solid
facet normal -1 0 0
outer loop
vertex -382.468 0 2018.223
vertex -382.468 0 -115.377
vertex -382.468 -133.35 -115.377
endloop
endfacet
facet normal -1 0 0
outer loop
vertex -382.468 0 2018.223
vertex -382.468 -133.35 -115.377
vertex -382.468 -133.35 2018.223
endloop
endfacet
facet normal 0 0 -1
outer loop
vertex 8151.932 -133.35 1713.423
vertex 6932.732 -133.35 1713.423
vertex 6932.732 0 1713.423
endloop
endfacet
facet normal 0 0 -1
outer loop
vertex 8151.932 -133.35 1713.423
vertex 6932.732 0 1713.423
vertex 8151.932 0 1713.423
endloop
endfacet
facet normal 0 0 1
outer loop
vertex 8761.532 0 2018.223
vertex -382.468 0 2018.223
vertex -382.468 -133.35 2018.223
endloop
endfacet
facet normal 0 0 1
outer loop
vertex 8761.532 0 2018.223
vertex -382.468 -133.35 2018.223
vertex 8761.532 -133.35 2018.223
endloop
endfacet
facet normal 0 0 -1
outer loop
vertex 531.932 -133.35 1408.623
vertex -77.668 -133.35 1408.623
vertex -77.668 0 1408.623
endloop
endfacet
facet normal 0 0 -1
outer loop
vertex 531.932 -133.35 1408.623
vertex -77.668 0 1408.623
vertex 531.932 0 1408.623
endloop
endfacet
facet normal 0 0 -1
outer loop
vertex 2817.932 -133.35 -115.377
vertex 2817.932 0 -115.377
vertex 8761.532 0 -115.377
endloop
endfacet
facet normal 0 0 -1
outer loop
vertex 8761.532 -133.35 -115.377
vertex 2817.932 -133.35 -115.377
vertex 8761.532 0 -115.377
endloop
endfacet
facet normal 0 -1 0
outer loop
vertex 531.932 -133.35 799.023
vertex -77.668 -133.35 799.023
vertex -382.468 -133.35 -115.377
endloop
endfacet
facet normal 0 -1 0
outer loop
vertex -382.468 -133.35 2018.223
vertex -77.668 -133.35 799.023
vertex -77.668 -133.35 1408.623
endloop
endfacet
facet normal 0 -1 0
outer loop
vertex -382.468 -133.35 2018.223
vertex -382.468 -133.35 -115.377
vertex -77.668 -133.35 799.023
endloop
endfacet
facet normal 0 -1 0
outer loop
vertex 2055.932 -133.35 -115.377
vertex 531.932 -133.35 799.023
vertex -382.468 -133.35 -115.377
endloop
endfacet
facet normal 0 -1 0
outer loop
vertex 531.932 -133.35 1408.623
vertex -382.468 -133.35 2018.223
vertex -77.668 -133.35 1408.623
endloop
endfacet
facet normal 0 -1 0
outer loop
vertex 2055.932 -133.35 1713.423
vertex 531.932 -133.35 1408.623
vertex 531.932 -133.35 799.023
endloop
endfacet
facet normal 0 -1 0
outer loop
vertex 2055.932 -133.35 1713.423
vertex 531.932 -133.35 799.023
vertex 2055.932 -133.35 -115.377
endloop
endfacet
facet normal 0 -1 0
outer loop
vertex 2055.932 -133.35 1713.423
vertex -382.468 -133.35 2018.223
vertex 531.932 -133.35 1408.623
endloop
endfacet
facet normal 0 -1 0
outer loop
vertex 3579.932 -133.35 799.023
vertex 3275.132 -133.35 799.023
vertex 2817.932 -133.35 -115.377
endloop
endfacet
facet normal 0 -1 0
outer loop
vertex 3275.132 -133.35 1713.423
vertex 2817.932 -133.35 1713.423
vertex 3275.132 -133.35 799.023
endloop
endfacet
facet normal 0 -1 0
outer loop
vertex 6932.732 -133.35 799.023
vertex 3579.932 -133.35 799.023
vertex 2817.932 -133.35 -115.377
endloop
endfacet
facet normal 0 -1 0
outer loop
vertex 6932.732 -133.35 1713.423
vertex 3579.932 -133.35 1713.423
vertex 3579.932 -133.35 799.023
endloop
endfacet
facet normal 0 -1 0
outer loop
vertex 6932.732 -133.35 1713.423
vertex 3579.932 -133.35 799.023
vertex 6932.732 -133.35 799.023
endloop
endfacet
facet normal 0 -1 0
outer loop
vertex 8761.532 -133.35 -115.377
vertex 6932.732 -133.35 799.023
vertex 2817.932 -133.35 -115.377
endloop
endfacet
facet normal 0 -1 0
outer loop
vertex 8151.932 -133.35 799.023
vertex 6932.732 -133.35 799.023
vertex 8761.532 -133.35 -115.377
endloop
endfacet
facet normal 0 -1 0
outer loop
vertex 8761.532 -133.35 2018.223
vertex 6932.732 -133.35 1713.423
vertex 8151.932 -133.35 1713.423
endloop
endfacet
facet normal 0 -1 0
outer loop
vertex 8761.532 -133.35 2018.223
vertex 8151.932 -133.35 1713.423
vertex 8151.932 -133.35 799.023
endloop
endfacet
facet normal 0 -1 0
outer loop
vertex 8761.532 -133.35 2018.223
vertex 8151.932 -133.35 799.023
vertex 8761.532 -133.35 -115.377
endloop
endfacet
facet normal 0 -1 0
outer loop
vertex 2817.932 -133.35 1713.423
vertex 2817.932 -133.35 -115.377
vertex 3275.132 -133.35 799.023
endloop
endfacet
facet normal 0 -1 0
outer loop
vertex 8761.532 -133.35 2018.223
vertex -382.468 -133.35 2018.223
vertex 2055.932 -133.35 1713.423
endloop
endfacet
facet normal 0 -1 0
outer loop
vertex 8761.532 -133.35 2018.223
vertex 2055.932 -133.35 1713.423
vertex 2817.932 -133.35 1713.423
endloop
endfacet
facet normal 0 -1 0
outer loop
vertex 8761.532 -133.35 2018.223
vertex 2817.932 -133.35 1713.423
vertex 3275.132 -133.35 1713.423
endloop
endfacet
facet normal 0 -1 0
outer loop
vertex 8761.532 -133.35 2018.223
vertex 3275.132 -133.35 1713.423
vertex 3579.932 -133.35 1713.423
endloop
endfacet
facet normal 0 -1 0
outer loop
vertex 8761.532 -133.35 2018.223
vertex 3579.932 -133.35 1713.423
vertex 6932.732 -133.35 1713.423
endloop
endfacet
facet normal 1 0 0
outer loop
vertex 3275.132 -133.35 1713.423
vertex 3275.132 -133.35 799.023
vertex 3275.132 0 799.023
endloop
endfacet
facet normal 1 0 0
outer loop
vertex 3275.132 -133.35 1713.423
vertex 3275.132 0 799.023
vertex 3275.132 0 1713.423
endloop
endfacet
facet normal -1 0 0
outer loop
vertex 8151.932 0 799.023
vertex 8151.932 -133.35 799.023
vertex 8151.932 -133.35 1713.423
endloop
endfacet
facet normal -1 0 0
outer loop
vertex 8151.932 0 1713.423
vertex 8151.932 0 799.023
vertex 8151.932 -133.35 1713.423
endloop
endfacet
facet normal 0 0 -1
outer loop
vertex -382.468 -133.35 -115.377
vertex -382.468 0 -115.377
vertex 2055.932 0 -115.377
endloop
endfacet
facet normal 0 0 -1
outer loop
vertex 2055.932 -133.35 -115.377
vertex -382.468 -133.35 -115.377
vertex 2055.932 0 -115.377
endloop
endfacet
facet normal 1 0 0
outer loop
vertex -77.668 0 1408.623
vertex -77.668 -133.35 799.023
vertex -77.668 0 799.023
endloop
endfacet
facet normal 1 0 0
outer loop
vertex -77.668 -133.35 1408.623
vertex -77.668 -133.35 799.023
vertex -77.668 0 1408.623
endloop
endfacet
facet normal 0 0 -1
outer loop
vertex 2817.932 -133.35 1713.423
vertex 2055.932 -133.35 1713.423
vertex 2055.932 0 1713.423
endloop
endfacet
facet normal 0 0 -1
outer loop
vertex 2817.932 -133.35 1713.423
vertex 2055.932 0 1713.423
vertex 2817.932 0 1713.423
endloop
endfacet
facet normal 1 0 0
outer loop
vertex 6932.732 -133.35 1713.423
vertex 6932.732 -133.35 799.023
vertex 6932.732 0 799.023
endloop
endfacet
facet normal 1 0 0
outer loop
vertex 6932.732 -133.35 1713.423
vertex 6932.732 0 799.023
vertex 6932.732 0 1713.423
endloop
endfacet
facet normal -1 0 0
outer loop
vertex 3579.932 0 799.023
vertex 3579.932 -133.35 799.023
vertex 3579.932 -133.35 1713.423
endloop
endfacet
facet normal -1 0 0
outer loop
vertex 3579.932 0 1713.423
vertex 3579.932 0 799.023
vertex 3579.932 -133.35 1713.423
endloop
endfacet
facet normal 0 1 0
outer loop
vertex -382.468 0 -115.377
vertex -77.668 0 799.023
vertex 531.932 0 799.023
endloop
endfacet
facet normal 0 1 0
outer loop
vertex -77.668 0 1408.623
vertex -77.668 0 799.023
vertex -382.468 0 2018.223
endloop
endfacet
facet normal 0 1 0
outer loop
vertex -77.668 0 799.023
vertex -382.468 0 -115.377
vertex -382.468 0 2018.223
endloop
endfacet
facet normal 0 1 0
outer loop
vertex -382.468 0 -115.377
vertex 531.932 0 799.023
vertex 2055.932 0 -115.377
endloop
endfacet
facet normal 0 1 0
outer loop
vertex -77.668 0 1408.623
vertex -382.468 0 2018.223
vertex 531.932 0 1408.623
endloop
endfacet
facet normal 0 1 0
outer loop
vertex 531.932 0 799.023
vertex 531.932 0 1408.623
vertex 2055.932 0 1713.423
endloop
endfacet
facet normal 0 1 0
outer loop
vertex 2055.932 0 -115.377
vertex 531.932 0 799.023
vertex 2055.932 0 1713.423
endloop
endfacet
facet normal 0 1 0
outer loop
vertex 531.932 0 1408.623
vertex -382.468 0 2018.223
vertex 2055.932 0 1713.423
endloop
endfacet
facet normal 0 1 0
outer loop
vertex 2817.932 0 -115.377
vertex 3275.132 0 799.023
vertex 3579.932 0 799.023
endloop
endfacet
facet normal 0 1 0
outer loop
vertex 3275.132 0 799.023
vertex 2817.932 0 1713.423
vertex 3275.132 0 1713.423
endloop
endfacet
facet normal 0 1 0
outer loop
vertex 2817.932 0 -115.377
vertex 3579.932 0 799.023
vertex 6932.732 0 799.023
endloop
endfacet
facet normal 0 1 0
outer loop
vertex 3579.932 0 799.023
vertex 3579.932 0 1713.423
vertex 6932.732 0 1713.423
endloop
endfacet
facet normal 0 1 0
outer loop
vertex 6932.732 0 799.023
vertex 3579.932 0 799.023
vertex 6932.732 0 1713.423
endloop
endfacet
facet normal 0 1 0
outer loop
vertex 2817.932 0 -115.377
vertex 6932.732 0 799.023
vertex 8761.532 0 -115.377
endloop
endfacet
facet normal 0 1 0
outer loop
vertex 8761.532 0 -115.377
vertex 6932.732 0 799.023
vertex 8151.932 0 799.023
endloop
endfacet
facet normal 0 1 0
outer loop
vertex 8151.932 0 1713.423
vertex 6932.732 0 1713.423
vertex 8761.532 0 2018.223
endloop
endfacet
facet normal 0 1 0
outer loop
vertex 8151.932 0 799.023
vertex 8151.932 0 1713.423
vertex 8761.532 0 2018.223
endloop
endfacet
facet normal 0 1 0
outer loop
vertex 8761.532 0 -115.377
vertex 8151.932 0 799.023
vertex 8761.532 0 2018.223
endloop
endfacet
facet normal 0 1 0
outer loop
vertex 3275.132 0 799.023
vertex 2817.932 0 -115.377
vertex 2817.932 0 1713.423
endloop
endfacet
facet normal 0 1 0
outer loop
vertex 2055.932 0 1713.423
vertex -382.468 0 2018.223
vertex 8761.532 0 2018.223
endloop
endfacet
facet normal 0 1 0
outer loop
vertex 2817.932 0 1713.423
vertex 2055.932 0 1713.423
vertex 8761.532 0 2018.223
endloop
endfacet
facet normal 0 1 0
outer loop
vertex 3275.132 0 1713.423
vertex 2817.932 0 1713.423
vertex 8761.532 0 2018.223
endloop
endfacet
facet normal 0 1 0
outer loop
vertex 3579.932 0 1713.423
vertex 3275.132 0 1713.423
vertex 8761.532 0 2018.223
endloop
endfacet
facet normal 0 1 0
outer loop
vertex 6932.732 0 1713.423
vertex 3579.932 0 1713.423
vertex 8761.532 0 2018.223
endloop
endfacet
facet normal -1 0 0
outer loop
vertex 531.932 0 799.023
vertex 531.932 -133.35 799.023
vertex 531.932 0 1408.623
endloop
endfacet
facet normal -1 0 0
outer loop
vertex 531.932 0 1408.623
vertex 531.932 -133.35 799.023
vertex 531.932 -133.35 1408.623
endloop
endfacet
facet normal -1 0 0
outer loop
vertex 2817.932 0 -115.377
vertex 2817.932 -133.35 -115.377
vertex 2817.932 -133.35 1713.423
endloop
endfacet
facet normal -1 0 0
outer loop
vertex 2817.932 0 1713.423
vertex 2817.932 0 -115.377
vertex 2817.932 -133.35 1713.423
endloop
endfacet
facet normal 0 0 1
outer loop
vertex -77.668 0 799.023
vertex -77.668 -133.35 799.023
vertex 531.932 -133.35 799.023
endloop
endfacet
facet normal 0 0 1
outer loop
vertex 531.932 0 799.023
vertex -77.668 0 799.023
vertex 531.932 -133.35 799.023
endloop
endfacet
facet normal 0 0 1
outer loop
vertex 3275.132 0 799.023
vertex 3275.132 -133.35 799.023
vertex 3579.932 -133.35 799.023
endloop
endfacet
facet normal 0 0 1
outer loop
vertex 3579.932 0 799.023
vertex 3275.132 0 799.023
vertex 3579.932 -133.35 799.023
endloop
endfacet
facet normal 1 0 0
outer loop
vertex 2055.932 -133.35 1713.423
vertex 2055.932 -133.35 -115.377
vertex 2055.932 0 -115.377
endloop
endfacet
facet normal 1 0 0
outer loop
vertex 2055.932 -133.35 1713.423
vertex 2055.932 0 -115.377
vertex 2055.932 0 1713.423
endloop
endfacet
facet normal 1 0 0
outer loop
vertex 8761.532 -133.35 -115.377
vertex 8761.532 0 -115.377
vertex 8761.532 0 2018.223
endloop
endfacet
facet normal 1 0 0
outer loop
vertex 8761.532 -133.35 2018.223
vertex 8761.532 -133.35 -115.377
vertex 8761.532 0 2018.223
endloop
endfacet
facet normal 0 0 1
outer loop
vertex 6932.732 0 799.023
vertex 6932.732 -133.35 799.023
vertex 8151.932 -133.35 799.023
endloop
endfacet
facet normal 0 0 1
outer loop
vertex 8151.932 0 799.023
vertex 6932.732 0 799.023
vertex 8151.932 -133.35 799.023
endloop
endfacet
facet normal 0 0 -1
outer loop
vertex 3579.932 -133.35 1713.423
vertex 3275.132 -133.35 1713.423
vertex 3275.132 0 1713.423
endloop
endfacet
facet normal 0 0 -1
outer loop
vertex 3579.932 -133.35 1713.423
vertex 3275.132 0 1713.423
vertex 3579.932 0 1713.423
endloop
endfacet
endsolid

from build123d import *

# Parameters (mm, degrees)
F0_W     = 9144
F0_H     = 2133.6
F1_DEPTH = 133.35
F2_W     = 609.6
F2_H     = 609.6
F2_W_2   = 762
F2_H_2   = 1828.8
F2_W_3   = 304.8
F2_H_3   = 914.4
F2_W_4   = 1219.2
F3_DEPTH = 133.35


with BuildPart() as f1:
    # F0 (on Front) → F1 (new body)
    with BuildSketch(Plane.XZ):
        with Locations((4189.531926, 951.422747)):
            Rectangle(F0_W, F0_H)
    extrude(amount=F1_DEPTH)

    # F2 (on face) → F3 (cut)
    with BuildSketch(Plane.XZ.offset(133.35)):
        with Locations((227.131926, 1103.822747)):
            Rectangle(F2_W, F2_H)
        with Locations((2436.931926, 799.022747)):
            Rectangle(F2_W_2, F2_H_2)
        with Locations((3427.531926, 1256.222747)):
            Rectangle(F2_W_3, F2_H_3)
        with Locations((7542.331926, 1256.222747)):
            Rectangle(F2_W_4, F2_H_3)
    extrude(amount=-F3_DEPTH, mode=Mode.SUBTRACT)


solid = f1.part
